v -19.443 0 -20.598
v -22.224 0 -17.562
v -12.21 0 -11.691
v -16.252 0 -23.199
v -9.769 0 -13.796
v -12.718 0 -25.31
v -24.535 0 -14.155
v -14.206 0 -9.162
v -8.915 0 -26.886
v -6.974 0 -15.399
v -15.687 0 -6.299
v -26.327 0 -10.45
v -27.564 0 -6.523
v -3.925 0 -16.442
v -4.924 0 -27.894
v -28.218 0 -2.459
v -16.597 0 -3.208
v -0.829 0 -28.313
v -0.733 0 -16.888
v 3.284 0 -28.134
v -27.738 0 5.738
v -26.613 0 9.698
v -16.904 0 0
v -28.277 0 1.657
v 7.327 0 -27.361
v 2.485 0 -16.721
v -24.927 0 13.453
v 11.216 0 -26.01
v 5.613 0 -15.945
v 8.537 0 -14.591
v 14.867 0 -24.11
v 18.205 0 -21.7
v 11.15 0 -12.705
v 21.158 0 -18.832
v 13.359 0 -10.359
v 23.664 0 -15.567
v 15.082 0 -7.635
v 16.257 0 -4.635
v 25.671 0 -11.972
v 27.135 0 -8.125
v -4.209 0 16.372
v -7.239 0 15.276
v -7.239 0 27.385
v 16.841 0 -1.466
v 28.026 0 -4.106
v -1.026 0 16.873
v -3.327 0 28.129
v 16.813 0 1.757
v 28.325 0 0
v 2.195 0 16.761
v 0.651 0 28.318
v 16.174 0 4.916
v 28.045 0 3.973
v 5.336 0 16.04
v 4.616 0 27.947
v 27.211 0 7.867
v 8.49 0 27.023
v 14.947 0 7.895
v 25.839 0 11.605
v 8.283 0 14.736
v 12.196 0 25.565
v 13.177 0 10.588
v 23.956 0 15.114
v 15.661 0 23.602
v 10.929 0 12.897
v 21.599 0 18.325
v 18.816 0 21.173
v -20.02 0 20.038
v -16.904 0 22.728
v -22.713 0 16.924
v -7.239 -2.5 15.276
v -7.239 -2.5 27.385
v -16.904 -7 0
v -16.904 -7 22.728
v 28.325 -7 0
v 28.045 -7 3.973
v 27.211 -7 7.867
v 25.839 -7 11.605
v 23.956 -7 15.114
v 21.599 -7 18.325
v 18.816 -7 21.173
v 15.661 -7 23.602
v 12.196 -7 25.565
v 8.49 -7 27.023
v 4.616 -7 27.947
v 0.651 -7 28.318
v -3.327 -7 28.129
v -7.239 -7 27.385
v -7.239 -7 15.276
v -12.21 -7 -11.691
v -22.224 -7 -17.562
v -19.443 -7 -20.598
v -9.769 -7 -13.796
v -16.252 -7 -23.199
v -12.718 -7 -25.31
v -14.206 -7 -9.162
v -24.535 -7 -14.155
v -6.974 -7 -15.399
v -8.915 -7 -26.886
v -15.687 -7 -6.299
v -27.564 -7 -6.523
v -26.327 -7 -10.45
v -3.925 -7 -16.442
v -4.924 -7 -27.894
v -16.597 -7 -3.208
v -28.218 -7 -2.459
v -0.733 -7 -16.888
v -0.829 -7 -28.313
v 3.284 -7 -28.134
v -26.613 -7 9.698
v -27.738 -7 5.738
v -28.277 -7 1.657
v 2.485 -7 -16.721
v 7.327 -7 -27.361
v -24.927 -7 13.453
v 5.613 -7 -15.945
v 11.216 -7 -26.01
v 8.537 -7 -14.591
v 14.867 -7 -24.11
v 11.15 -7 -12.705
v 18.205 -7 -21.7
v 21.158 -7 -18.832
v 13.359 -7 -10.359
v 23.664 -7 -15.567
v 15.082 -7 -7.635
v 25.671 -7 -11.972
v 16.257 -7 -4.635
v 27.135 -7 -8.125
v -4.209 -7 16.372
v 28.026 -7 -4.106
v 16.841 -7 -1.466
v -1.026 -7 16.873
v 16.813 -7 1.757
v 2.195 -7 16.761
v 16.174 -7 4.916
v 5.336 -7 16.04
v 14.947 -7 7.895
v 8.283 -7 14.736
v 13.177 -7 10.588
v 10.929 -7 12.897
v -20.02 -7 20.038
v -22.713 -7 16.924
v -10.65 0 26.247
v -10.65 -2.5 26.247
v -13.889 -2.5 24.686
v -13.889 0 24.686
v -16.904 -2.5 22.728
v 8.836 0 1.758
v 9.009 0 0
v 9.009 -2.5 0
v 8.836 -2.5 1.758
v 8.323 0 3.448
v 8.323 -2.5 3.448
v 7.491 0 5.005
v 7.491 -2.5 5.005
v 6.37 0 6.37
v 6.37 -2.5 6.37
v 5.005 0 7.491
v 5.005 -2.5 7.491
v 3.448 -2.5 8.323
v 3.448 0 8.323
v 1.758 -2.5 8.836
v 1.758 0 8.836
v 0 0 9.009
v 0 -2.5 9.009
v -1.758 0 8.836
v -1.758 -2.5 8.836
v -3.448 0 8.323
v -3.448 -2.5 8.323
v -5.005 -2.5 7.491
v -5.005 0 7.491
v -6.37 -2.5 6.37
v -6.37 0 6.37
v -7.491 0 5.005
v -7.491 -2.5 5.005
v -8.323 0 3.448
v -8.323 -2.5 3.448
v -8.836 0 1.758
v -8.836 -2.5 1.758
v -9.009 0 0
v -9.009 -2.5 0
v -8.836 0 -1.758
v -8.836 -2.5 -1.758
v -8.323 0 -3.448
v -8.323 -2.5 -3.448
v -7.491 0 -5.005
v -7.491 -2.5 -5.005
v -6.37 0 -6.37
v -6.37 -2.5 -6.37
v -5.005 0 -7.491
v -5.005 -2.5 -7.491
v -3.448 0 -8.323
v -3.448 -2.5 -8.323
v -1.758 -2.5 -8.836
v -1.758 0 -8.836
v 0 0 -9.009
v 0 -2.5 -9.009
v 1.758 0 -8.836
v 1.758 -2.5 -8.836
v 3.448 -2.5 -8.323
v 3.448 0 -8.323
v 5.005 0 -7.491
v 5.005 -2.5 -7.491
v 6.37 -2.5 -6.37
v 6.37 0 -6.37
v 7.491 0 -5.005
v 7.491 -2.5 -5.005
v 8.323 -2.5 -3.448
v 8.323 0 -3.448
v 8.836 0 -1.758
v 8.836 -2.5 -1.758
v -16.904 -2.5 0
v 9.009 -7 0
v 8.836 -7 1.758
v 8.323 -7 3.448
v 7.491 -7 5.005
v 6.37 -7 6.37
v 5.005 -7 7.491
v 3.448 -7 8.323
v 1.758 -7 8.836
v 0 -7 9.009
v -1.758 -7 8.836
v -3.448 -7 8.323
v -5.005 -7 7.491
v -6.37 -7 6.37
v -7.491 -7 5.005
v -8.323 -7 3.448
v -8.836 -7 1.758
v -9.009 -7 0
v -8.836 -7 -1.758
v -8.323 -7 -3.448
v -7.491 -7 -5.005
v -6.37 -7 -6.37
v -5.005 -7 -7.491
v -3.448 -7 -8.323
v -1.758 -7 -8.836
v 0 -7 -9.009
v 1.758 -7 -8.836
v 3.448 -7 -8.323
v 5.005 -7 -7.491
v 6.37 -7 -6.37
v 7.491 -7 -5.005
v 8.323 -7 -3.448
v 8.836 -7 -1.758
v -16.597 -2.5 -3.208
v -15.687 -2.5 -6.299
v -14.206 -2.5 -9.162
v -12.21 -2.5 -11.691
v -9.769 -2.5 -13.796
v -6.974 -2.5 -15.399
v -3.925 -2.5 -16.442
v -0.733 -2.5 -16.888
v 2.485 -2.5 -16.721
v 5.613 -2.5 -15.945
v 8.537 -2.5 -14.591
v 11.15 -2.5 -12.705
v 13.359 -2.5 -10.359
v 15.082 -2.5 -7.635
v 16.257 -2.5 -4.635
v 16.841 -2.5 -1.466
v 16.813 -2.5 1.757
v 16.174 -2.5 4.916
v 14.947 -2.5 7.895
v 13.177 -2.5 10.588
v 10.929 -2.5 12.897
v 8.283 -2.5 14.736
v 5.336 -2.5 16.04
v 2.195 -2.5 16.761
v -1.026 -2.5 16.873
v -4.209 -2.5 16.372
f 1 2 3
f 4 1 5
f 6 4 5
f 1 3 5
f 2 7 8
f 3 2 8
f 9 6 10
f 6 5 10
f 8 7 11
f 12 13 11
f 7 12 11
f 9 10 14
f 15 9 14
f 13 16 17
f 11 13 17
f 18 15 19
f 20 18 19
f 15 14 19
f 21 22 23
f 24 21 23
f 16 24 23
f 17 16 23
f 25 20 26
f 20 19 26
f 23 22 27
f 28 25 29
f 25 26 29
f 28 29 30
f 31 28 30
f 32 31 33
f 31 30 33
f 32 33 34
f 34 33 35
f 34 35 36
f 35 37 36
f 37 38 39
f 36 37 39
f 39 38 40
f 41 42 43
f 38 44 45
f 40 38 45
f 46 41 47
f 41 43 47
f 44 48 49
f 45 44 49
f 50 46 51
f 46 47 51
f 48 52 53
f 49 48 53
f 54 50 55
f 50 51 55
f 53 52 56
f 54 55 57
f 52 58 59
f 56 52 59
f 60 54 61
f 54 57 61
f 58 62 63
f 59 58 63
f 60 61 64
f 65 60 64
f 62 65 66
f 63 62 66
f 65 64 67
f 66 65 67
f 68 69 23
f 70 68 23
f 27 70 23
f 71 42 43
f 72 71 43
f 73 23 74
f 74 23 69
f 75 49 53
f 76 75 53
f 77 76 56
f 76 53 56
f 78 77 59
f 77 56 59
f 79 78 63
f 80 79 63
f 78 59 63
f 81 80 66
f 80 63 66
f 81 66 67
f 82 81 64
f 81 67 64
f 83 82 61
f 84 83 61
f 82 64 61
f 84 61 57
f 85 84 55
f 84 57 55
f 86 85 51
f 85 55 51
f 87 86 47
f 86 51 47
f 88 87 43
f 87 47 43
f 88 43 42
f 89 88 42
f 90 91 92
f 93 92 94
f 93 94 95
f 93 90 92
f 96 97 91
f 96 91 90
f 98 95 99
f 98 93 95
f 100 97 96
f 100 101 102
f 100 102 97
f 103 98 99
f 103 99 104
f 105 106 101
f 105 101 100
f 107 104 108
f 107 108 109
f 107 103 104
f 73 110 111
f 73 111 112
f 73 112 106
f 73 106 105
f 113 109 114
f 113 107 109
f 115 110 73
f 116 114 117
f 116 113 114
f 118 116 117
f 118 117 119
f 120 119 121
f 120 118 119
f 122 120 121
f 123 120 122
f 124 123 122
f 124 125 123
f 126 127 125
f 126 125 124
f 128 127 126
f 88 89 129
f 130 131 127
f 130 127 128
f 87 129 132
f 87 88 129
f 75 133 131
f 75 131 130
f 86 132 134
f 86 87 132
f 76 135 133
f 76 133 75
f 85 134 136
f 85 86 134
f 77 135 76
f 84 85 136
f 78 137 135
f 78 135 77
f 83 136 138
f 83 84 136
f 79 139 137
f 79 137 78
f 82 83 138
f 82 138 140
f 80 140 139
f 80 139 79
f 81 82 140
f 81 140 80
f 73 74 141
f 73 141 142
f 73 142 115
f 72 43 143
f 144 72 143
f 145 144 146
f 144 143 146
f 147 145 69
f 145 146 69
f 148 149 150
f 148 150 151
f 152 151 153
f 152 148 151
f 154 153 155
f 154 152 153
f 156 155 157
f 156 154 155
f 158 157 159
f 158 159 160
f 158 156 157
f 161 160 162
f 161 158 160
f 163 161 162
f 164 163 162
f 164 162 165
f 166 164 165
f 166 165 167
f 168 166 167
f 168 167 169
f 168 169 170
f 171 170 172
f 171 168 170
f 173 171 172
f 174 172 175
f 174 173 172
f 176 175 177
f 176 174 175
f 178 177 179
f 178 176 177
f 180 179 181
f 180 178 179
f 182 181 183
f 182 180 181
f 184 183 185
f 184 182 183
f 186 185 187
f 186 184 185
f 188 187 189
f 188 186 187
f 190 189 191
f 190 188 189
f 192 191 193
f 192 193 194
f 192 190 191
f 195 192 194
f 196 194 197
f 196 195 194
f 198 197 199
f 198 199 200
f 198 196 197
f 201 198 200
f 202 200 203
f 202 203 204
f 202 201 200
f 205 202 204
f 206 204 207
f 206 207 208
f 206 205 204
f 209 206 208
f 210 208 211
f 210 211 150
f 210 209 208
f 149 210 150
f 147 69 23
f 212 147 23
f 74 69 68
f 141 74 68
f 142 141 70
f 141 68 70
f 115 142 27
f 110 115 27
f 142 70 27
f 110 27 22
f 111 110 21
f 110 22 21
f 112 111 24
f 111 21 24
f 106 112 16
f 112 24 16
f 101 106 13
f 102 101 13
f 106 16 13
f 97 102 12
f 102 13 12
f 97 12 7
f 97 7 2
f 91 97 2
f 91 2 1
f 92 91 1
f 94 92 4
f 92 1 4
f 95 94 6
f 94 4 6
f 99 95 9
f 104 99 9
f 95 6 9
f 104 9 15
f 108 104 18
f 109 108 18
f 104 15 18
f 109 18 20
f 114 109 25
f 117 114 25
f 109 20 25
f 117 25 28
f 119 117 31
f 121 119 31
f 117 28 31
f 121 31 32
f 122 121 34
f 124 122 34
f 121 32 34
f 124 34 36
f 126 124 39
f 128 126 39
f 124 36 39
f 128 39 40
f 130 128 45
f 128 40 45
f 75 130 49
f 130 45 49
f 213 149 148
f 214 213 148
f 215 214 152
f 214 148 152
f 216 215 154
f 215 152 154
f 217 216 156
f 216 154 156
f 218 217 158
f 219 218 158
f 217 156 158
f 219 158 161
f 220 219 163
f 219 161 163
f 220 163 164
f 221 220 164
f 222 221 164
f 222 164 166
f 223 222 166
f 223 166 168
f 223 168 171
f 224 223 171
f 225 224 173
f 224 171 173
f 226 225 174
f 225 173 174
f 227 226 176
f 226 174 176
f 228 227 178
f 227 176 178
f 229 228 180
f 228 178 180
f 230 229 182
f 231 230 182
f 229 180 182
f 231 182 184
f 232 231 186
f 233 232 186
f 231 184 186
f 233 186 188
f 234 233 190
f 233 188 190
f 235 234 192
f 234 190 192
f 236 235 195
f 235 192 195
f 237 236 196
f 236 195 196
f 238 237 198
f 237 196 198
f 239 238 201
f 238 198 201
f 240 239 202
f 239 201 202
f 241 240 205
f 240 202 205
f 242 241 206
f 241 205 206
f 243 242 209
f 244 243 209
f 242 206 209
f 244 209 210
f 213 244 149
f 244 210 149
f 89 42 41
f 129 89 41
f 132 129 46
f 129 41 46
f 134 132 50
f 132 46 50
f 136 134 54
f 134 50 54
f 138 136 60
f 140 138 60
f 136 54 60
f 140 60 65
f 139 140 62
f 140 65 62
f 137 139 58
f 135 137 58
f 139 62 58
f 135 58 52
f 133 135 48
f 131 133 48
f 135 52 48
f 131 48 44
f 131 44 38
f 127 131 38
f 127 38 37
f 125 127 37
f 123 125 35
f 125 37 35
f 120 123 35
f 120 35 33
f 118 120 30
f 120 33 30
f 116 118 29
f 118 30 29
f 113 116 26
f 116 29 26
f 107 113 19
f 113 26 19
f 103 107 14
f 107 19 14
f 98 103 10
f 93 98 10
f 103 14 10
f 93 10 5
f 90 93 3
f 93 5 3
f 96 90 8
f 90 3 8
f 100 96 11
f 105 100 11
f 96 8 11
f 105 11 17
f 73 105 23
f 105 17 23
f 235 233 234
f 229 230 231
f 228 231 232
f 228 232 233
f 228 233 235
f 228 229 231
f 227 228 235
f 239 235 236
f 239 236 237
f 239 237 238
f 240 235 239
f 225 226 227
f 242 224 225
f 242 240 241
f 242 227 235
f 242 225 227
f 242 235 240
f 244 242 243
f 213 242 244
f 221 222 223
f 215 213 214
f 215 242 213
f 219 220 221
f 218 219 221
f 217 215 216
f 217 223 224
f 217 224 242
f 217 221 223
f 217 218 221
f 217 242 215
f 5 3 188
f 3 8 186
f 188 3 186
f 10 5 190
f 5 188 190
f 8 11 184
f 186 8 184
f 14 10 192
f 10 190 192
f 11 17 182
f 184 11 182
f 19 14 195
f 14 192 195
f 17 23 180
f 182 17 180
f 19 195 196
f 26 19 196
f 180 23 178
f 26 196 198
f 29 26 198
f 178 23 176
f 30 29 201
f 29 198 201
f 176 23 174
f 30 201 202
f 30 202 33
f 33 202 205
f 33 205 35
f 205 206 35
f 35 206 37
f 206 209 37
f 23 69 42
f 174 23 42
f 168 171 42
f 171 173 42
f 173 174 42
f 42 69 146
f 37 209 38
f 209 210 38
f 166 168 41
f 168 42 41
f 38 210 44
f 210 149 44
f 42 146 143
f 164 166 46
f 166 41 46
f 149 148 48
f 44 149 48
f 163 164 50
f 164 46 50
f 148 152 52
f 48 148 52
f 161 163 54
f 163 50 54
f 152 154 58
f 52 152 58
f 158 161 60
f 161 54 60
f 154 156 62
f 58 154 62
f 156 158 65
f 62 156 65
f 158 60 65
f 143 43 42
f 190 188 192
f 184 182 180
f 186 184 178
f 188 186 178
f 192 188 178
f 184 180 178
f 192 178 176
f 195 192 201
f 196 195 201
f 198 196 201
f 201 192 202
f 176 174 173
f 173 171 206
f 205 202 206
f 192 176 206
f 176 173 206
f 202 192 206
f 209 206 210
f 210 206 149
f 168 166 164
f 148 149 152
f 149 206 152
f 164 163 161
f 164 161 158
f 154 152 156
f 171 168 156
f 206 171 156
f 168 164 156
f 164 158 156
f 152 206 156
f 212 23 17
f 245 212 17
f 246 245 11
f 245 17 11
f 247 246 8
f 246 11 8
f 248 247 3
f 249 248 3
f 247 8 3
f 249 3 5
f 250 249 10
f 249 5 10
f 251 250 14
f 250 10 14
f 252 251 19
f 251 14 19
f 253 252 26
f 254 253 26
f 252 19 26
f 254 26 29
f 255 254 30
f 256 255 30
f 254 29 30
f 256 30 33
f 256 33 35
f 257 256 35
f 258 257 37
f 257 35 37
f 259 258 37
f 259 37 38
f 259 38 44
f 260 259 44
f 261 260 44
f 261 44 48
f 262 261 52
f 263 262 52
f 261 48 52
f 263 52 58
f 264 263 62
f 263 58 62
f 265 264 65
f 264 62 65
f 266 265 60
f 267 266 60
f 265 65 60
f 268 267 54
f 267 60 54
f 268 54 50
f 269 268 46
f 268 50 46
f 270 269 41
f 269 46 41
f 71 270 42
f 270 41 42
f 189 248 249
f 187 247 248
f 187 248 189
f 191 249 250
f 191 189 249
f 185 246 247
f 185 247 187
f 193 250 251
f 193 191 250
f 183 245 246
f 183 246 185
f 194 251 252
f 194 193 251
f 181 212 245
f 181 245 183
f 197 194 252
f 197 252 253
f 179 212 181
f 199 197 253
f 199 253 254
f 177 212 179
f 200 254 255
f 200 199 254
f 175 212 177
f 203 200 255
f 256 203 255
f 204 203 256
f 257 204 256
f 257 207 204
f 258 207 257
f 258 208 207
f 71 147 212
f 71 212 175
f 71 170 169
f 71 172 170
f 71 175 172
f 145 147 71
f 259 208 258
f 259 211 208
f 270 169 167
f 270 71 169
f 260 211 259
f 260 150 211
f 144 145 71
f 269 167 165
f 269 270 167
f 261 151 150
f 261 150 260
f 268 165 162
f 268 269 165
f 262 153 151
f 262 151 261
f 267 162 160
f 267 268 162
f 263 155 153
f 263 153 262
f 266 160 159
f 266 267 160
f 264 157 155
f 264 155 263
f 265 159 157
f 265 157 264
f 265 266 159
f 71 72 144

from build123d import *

# Parameters (mm, degrees)
F0_R     = 9.009156
F1_DEPTH = 7
F2_DEPTH = 7
F3_DEPTH = 2.5


with BuildPart() as f1:
    # F0 (on Front) → F1 (new body)
    with BuildSketch(Plane.XZ):
        Circle(F0_R)
    extrude(amount=F1_DEPTH)


with BuildPart() as f2:
    # F0 (on Front) → F2 (new body)
    with BuildSketch(Plane.XZ):
        with BuildLine():
            ThreePointArc((-16.904339, 22.728107), (-12.718152, -25.309526), (28.325316, 0))
            ThreePointArc((28.325316, 0), (17.280956, 22.443085), (-7.239482, 27.384547))
            Line((-7.239482, 27.384547), (-7.239482, 15.275686))
            ThreePointArc((-7.239482, 15.275686), (14.285226, -9.038197), (-16.904339, 0))
            Line((-16.904339, 0), (-16.904339, 22.728107))
        make_face()
    extrude(amount=F2_DEPTH)


with BuildPart() as f3:
    # F0 (on Front) → F3 (new body)
    with BuildSketch(Plane.XZ):
        with BuildLine():
            Line((-7.239482, 15.275686), (-7.239482, 27.384547))
            ThreePointArc((-7.239482, 27.384547), (-12.294374, 25.51807), (-16.904339, 22.728107))
            Line((-16.904339, 22.728107), (-16.904339, 0))
            ThreePointArc((-16.904339, 0), (14.285226, -9.038197), (-7.239482, 15.275686))
        make_face()
        Circle(F0_R, mode=Mode.SUBTRACT)
    extrude(amount=F3_DEPTH)


solid = Compound([f1.part, f2.part, f3.part])
